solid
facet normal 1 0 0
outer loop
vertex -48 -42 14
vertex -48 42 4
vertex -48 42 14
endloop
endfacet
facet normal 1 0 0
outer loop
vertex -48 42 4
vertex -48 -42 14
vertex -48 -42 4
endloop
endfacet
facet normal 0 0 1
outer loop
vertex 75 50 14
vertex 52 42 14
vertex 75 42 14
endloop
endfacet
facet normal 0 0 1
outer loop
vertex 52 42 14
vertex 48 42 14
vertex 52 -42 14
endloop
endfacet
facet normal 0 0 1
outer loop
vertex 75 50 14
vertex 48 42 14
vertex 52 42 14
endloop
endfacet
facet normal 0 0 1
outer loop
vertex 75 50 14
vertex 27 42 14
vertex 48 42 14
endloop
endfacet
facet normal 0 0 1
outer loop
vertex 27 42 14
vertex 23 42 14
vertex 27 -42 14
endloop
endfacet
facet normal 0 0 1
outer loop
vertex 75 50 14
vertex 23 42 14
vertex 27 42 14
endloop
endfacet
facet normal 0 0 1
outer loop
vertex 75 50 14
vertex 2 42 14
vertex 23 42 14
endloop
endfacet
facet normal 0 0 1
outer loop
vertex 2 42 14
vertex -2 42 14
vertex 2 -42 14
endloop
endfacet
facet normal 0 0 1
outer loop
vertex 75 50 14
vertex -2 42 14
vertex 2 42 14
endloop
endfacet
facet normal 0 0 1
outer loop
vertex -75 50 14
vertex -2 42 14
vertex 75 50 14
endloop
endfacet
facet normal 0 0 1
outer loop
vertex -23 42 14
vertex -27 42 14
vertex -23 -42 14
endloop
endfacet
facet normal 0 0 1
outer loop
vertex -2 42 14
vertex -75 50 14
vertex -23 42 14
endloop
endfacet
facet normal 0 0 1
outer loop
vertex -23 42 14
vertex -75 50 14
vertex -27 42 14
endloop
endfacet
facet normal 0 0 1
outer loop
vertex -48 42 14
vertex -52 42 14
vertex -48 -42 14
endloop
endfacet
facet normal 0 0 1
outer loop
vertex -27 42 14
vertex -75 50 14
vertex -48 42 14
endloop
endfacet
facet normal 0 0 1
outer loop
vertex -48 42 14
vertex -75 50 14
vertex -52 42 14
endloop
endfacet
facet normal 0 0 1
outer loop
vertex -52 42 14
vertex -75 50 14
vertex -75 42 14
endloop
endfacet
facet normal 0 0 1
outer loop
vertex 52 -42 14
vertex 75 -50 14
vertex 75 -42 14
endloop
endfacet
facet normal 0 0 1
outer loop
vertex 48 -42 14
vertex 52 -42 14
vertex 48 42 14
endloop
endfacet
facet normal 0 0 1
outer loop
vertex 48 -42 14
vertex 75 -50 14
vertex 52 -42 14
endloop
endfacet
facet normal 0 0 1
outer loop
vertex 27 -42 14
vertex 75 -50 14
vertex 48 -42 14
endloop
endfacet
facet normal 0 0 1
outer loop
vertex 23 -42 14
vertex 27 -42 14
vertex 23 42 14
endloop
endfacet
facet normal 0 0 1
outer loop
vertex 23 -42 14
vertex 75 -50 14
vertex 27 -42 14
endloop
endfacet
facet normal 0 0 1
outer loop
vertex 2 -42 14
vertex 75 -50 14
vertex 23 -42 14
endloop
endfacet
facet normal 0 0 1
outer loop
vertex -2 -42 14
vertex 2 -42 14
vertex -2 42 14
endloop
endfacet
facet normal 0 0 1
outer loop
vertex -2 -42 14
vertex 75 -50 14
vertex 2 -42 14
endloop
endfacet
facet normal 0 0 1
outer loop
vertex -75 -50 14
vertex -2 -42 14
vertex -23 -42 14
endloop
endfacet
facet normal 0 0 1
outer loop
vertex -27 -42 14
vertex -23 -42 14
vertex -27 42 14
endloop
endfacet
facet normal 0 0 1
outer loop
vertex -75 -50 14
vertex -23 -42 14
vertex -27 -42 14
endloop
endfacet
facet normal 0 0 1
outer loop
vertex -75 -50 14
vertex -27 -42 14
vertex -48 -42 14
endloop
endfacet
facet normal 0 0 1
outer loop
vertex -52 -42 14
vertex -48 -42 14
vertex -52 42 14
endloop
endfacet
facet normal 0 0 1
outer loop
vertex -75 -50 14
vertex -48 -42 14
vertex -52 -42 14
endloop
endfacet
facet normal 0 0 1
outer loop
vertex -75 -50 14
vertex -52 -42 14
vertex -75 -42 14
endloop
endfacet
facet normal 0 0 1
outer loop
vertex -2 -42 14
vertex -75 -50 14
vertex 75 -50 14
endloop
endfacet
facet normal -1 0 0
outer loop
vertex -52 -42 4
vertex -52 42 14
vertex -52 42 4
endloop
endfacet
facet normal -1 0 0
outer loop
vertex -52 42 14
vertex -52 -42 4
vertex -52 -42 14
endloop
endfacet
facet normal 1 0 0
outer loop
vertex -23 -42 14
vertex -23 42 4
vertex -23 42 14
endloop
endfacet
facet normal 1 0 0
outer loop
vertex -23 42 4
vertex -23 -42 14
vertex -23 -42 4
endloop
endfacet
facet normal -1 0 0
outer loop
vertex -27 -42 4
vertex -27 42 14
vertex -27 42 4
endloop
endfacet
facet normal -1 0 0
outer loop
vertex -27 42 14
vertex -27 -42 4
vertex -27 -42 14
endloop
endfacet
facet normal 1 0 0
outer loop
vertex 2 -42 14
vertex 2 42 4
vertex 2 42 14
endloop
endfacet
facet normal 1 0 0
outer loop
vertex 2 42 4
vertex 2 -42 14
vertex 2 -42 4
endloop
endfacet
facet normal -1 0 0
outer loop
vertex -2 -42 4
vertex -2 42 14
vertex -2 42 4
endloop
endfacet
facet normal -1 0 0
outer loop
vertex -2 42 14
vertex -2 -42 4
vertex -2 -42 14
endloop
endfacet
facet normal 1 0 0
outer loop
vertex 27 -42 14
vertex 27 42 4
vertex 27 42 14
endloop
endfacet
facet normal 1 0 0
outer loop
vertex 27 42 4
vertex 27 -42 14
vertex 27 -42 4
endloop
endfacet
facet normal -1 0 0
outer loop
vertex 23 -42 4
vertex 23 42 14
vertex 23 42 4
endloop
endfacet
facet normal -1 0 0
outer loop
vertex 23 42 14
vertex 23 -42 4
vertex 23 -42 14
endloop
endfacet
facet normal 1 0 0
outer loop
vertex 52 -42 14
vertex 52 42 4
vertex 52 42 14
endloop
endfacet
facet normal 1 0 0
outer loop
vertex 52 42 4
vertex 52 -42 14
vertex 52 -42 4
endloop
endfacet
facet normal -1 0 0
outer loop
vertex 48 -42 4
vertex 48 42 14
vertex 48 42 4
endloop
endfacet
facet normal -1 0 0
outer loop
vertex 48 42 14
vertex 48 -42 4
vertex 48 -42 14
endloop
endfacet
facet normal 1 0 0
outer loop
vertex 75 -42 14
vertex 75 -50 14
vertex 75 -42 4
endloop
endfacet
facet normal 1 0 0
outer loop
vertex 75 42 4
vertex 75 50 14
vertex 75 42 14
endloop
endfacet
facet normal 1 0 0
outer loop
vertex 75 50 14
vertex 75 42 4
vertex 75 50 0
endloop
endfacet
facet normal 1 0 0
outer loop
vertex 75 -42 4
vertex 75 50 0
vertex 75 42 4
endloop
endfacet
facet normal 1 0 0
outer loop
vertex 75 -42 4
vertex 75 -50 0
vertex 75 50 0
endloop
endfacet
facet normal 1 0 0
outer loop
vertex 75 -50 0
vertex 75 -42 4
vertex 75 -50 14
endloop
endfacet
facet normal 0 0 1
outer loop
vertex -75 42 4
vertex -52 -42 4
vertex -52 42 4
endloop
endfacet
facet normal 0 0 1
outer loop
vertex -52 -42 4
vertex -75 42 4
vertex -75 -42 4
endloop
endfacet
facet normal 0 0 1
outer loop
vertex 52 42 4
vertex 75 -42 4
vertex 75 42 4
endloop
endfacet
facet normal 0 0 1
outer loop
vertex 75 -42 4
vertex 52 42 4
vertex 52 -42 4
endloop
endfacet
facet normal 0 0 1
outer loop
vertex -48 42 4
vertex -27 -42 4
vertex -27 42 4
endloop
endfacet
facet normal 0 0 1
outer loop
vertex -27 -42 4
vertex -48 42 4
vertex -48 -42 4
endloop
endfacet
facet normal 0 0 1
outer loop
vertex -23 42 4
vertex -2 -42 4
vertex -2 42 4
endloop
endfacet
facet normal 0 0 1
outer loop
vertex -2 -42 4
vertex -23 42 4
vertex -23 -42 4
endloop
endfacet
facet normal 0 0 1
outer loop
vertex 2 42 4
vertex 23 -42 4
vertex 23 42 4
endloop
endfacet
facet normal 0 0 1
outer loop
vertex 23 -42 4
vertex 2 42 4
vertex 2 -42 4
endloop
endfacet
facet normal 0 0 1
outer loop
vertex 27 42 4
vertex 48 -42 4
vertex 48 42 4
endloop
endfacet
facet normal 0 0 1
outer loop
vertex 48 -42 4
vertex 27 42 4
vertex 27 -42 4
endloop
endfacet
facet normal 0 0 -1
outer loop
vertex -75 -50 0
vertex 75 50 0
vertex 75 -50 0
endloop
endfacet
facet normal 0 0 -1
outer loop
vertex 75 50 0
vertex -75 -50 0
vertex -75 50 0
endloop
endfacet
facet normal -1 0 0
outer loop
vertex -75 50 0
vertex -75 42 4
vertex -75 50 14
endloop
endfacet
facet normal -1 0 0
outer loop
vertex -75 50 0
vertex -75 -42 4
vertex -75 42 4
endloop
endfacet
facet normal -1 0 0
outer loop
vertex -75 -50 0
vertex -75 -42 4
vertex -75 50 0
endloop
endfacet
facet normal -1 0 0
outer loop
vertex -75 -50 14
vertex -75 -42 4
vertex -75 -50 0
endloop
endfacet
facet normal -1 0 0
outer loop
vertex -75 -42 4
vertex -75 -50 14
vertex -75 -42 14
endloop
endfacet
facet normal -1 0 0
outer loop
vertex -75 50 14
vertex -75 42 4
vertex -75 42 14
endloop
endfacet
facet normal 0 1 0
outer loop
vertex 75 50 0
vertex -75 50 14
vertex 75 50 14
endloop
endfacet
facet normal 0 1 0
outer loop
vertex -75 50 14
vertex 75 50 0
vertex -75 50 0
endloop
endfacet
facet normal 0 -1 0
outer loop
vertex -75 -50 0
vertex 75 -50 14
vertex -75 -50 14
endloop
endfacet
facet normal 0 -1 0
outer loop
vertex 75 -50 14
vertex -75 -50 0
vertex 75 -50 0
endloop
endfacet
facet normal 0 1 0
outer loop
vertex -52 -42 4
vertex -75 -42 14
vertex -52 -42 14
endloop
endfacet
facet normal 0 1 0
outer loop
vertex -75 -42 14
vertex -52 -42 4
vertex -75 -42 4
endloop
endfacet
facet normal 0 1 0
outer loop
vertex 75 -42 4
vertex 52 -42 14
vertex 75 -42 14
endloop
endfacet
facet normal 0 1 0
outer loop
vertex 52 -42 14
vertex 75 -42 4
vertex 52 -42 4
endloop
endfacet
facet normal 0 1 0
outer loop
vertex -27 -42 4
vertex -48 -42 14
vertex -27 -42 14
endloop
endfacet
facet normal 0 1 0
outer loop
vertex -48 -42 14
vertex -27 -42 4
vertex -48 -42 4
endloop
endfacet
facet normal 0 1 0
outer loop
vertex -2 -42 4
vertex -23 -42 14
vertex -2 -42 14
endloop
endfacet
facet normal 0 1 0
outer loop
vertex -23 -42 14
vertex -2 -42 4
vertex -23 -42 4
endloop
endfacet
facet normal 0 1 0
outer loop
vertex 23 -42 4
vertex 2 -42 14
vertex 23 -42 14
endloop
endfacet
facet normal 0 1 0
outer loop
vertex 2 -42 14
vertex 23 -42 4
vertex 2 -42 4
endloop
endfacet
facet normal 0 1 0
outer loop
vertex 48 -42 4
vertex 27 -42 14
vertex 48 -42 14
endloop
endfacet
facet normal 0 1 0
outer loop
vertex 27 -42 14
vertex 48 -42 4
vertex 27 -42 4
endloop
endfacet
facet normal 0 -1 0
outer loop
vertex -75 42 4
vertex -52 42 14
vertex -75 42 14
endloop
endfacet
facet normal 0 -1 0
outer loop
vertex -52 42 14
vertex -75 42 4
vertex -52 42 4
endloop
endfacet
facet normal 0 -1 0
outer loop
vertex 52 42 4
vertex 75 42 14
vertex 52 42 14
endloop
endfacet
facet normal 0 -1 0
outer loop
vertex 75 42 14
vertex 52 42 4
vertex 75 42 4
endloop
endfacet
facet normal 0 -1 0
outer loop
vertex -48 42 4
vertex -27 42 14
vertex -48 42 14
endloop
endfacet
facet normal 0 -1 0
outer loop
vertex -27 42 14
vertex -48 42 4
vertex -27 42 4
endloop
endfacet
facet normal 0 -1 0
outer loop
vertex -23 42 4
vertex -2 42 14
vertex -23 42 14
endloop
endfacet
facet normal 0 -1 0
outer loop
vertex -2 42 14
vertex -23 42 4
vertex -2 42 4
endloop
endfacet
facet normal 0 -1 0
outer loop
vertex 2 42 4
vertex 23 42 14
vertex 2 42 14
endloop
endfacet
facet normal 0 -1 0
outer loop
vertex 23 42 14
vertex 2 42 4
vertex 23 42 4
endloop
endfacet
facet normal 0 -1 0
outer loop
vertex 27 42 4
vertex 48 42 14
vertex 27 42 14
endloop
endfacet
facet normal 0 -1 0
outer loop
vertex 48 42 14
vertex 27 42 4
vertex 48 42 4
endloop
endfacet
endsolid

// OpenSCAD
$fn = 32;

// ----------------------------------------------------------------------
// Rib frame 150 x 100 x 14
// 5 ribs at 25 mm pitch
// ----------------------------------------------------------------------

// --- parameters (mm) ---
frame = [150, 100, 4];  // base plate size (x, y, z)
rail_w = 8;             // side rail width
ribs = 5;               // number of ribs
rib_t = 4;              // rib thickness
rib_h = 10;             // rib height above the base plate
pitch = 25;             // pitch between rib centres

// --- derived feature positions (mm) ---
span = (ribs - 1) * pitch;          // = 100   distance between the outer ribs
origin_x = -span / 2;               // = -50   X of the first rib
rib_len = frame[1] - 2 * rail_w + 2;  // = 86   rib length, 1 mm into each rail
feature_centers = [
  [origin_x + 0 * pitch, 0],
  [origin_x + 1 * pitch, 0],
  [origin_x + 2 * pitch, 0],
  [origin_x + 3 * pitch, 0],
  [origin_x + 4 * pitch, 0]
];   // rib centre line, drives the rib loop

// base plate, two side rails, then the ribs read straight off feature_centers
union() {
  translate([-frame[0] / 2, -frame[1] / 2, 0]) cube(frame);
  translate([-frame[0] / 2, -frame[1] / 2, 0]) cube([frame[0], rail_w, frame[2] + rib_h]);
  translate([-frame[0] / 2, frame[1] / 2 - rail_w, 0]) cube([frame[0], rail_w, frame[2] + rib_h]);
  for (centre = feature_centers)
    translate([centre[0] - rib_t / 2, centre[1] - rib_len / 2, frame[2] - 1])
      cube([rib_t, rib_len, rib_h + 1]);
}
